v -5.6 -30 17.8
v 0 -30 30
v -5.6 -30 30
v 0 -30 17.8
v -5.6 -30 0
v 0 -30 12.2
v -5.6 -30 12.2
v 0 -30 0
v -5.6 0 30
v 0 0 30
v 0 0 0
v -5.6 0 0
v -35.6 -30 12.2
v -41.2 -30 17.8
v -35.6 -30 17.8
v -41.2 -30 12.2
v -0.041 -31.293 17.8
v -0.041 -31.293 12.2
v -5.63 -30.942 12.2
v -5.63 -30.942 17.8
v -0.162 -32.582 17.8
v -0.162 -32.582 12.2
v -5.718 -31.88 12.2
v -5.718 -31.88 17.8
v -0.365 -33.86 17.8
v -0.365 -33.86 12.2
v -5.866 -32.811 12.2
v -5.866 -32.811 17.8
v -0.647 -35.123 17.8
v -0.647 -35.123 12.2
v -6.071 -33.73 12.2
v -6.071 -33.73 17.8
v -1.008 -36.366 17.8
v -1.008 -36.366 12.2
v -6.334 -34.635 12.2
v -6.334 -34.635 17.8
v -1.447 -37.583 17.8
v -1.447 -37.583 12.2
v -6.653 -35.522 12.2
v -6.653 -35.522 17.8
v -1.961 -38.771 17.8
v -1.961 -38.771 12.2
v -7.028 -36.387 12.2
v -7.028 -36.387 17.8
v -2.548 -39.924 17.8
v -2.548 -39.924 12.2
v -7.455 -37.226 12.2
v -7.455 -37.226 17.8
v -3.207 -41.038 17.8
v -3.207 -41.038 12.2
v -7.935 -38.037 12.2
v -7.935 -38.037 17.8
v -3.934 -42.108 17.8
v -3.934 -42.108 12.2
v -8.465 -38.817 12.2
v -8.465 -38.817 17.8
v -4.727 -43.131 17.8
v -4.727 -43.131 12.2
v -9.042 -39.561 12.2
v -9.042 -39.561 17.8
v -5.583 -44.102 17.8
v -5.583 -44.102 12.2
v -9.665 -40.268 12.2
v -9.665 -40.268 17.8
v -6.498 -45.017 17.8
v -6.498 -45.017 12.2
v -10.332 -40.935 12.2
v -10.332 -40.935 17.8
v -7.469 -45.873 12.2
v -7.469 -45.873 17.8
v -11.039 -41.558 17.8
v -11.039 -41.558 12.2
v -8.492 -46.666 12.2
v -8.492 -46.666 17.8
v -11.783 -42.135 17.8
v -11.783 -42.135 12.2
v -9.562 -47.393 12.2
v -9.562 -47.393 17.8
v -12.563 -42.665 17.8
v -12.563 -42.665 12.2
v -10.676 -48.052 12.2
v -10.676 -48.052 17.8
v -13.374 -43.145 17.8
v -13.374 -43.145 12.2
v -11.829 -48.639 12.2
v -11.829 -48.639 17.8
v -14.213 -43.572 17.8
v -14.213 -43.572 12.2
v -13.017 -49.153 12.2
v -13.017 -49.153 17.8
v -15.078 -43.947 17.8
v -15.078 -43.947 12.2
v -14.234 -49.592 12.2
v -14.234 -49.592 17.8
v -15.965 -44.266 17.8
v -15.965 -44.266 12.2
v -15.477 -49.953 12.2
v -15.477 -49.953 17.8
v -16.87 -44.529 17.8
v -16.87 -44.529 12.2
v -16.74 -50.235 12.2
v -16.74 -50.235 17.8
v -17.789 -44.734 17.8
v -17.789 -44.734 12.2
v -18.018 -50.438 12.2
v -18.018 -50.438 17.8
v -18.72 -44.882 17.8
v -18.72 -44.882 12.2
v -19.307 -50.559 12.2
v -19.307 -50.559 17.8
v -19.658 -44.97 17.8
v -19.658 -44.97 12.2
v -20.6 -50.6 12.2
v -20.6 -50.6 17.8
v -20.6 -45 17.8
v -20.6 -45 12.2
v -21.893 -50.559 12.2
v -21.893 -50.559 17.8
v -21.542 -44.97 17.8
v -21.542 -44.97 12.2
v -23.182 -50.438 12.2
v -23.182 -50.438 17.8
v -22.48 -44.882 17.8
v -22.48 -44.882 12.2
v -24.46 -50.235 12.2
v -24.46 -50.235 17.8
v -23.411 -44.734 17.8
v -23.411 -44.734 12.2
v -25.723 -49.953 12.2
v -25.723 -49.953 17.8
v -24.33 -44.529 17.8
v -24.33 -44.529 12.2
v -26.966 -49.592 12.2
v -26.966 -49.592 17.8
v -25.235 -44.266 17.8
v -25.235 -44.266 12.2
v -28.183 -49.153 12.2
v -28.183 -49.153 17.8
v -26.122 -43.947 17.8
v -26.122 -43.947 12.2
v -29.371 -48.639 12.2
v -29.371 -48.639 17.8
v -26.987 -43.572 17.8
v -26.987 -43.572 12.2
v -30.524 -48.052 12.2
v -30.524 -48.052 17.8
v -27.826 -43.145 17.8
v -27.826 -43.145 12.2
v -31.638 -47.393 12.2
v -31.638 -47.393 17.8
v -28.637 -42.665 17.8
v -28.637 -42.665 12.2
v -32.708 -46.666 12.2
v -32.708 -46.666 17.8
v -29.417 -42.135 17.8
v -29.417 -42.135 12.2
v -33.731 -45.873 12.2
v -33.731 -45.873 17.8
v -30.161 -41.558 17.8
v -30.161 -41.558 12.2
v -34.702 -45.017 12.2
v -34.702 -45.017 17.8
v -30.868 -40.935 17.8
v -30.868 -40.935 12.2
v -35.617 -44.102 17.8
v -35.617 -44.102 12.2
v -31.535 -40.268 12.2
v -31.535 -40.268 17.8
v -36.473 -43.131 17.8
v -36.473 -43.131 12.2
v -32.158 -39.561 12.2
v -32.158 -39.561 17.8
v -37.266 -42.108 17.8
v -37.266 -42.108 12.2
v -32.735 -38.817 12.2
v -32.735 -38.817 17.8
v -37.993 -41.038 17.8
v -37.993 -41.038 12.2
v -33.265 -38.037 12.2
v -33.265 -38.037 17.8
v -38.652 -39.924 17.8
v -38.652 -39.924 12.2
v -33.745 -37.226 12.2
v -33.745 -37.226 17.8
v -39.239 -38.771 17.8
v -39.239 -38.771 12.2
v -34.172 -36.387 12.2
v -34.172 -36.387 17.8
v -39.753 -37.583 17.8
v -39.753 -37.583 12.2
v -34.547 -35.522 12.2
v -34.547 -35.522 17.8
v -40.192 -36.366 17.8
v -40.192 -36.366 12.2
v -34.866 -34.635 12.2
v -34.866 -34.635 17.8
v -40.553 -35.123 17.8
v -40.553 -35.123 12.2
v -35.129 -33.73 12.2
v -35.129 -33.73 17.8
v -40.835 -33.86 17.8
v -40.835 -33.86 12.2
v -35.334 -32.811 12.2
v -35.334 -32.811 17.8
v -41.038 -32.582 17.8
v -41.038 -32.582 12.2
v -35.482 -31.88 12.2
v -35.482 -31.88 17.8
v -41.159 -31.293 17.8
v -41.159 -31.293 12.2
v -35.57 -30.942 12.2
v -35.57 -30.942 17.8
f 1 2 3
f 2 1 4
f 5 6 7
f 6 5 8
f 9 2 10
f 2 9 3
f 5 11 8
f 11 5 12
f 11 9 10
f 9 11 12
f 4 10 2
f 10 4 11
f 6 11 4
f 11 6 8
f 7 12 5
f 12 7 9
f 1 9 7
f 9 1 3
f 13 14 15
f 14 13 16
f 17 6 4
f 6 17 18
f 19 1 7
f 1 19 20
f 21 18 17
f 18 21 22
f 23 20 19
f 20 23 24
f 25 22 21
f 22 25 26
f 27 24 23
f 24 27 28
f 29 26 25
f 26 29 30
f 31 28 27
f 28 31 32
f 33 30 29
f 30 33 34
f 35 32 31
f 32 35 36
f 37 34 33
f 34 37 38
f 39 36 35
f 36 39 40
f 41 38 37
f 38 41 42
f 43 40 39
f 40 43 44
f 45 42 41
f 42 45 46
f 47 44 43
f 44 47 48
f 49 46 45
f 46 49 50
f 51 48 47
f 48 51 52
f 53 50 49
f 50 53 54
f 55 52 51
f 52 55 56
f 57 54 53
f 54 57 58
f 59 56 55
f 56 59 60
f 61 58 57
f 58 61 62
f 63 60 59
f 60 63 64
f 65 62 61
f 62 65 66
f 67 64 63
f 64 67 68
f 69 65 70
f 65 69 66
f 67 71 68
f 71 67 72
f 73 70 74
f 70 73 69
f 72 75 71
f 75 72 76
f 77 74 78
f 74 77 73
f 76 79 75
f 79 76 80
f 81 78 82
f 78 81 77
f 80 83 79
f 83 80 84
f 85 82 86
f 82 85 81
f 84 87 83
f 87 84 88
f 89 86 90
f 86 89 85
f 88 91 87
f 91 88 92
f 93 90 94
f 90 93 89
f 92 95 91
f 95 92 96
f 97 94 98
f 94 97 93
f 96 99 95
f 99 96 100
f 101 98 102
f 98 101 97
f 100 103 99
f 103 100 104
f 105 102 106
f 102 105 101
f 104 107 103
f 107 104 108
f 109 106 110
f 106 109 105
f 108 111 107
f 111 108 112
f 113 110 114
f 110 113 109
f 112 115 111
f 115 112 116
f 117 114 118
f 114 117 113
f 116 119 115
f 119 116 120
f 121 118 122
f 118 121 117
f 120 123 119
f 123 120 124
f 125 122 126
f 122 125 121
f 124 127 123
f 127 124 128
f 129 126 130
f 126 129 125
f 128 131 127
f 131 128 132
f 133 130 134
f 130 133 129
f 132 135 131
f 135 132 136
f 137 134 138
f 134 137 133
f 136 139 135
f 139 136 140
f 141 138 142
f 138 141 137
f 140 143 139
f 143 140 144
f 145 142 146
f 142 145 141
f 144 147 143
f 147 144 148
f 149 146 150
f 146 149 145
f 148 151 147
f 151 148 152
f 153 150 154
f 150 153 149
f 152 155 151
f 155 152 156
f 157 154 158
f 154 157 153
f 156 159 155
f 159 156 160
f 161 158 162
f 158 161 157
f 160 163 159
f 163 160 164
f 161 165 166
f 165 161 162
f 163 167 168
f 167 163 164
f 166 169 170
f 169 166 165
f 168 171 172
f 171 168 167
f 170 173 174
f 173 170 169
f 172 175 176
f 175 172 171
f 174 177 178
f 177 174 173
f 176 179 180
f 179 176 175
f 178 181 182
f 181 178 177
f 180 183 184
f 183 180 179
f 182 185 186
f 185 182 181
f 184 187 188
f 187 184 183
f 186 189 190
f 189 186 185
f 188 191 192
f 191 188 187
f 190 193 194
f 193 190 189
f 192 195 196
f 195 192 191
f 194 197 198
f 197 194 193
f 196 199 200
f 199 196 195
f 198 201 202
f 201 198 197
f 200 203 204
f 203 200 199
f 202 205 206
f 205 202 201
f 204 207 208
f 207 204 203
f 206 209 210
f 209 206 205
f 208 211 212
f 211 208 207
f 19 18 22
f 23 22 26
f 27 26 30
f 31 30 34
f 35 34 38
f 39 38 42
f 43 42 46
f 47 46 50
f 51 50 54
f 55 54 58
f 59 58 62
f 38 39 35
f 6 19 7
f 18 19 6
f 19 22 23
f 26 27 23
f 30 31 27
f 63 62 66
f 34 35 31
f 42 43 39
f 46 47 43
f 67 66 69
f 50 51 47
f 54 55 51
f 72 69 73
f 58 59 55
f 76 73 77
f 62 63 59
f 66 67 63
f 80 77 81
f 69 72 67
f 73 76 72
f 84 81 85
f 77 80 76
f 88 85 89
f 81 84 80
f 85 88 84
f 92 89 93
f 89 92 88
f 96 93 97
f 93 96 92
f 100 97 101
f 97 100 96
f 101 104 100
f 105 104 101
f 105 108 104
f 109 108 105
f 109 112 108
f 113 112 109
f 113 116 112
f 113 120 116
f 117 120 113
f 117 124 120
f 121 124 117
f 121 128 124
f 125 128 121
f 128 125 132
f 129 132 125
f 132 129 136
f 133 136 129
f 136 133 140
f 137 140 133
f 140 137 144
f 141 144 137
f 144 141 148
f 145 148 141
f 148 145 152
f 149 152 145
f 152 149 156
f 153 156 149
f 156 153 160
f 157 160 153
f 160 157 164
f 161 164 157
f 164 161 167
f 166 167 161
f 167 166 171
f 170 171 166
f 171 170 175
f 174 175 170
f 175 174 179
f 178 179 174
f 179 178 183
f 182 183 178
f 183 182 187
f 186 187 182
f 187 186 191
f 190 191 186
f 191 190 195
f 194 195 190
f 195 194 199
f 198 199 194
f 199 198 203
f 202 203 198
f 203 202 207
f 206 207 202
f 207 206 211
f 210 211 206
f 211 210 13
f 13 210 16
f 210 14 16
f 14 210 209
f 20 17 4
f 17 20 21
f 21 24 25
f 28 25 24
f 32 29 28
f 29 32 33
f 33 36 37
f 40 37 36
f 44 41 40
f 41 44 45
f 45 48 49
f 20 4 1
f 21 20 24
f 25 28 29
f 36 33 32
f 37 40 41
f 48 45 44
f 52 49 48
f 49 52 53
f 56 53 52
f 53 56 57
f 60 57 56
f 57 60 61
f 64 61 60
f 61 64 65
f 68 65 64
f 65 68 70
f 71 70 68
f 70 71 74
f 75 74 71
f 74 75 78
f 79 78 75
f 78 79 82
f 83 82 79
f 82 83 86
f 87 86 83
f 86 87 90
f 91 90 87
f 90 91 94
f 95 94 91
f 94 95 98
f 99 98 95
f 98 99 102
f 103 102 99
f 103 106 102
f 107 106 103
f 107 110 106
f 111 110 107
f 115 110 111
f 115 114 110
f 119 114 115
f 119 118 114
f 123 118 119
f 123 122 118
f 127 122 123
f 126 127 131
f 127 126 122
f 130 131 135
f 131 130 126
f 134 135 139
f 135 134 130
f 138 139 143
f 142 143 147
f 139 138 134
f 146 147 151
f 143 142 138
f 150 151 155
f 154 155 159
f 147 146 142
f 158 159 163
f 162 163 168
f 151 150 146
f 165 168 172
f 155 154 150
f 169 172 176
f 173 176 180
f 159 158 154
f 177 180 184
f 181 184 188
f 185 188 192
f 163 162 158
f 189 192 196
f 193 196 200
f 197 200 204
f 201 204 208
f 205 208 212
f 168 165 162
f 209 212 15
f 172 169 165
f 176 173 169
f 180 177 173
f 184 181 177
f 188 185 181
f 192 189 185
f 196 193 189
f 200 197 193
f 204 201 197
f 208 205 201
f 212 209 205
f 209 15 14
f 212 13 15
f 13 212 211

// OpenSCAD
smoothness = 100;

hole = 4 / 2;
thick = 0.4 * 14;
width = 0.28 * 20;
bar_len = 30;
bar_height = 30;
radius = 15;

translate([-thick,0,0])
    rotate([0,0,270])
        cube([30,thick,bar_height]);

translate([-(radius+thick), -bar_len, (bar_height/2)-(width/2) ])
rotate_extrude(angle=-180, $fn=smoothness)
    translate([radius,0,0])
        square([thick,width]);
